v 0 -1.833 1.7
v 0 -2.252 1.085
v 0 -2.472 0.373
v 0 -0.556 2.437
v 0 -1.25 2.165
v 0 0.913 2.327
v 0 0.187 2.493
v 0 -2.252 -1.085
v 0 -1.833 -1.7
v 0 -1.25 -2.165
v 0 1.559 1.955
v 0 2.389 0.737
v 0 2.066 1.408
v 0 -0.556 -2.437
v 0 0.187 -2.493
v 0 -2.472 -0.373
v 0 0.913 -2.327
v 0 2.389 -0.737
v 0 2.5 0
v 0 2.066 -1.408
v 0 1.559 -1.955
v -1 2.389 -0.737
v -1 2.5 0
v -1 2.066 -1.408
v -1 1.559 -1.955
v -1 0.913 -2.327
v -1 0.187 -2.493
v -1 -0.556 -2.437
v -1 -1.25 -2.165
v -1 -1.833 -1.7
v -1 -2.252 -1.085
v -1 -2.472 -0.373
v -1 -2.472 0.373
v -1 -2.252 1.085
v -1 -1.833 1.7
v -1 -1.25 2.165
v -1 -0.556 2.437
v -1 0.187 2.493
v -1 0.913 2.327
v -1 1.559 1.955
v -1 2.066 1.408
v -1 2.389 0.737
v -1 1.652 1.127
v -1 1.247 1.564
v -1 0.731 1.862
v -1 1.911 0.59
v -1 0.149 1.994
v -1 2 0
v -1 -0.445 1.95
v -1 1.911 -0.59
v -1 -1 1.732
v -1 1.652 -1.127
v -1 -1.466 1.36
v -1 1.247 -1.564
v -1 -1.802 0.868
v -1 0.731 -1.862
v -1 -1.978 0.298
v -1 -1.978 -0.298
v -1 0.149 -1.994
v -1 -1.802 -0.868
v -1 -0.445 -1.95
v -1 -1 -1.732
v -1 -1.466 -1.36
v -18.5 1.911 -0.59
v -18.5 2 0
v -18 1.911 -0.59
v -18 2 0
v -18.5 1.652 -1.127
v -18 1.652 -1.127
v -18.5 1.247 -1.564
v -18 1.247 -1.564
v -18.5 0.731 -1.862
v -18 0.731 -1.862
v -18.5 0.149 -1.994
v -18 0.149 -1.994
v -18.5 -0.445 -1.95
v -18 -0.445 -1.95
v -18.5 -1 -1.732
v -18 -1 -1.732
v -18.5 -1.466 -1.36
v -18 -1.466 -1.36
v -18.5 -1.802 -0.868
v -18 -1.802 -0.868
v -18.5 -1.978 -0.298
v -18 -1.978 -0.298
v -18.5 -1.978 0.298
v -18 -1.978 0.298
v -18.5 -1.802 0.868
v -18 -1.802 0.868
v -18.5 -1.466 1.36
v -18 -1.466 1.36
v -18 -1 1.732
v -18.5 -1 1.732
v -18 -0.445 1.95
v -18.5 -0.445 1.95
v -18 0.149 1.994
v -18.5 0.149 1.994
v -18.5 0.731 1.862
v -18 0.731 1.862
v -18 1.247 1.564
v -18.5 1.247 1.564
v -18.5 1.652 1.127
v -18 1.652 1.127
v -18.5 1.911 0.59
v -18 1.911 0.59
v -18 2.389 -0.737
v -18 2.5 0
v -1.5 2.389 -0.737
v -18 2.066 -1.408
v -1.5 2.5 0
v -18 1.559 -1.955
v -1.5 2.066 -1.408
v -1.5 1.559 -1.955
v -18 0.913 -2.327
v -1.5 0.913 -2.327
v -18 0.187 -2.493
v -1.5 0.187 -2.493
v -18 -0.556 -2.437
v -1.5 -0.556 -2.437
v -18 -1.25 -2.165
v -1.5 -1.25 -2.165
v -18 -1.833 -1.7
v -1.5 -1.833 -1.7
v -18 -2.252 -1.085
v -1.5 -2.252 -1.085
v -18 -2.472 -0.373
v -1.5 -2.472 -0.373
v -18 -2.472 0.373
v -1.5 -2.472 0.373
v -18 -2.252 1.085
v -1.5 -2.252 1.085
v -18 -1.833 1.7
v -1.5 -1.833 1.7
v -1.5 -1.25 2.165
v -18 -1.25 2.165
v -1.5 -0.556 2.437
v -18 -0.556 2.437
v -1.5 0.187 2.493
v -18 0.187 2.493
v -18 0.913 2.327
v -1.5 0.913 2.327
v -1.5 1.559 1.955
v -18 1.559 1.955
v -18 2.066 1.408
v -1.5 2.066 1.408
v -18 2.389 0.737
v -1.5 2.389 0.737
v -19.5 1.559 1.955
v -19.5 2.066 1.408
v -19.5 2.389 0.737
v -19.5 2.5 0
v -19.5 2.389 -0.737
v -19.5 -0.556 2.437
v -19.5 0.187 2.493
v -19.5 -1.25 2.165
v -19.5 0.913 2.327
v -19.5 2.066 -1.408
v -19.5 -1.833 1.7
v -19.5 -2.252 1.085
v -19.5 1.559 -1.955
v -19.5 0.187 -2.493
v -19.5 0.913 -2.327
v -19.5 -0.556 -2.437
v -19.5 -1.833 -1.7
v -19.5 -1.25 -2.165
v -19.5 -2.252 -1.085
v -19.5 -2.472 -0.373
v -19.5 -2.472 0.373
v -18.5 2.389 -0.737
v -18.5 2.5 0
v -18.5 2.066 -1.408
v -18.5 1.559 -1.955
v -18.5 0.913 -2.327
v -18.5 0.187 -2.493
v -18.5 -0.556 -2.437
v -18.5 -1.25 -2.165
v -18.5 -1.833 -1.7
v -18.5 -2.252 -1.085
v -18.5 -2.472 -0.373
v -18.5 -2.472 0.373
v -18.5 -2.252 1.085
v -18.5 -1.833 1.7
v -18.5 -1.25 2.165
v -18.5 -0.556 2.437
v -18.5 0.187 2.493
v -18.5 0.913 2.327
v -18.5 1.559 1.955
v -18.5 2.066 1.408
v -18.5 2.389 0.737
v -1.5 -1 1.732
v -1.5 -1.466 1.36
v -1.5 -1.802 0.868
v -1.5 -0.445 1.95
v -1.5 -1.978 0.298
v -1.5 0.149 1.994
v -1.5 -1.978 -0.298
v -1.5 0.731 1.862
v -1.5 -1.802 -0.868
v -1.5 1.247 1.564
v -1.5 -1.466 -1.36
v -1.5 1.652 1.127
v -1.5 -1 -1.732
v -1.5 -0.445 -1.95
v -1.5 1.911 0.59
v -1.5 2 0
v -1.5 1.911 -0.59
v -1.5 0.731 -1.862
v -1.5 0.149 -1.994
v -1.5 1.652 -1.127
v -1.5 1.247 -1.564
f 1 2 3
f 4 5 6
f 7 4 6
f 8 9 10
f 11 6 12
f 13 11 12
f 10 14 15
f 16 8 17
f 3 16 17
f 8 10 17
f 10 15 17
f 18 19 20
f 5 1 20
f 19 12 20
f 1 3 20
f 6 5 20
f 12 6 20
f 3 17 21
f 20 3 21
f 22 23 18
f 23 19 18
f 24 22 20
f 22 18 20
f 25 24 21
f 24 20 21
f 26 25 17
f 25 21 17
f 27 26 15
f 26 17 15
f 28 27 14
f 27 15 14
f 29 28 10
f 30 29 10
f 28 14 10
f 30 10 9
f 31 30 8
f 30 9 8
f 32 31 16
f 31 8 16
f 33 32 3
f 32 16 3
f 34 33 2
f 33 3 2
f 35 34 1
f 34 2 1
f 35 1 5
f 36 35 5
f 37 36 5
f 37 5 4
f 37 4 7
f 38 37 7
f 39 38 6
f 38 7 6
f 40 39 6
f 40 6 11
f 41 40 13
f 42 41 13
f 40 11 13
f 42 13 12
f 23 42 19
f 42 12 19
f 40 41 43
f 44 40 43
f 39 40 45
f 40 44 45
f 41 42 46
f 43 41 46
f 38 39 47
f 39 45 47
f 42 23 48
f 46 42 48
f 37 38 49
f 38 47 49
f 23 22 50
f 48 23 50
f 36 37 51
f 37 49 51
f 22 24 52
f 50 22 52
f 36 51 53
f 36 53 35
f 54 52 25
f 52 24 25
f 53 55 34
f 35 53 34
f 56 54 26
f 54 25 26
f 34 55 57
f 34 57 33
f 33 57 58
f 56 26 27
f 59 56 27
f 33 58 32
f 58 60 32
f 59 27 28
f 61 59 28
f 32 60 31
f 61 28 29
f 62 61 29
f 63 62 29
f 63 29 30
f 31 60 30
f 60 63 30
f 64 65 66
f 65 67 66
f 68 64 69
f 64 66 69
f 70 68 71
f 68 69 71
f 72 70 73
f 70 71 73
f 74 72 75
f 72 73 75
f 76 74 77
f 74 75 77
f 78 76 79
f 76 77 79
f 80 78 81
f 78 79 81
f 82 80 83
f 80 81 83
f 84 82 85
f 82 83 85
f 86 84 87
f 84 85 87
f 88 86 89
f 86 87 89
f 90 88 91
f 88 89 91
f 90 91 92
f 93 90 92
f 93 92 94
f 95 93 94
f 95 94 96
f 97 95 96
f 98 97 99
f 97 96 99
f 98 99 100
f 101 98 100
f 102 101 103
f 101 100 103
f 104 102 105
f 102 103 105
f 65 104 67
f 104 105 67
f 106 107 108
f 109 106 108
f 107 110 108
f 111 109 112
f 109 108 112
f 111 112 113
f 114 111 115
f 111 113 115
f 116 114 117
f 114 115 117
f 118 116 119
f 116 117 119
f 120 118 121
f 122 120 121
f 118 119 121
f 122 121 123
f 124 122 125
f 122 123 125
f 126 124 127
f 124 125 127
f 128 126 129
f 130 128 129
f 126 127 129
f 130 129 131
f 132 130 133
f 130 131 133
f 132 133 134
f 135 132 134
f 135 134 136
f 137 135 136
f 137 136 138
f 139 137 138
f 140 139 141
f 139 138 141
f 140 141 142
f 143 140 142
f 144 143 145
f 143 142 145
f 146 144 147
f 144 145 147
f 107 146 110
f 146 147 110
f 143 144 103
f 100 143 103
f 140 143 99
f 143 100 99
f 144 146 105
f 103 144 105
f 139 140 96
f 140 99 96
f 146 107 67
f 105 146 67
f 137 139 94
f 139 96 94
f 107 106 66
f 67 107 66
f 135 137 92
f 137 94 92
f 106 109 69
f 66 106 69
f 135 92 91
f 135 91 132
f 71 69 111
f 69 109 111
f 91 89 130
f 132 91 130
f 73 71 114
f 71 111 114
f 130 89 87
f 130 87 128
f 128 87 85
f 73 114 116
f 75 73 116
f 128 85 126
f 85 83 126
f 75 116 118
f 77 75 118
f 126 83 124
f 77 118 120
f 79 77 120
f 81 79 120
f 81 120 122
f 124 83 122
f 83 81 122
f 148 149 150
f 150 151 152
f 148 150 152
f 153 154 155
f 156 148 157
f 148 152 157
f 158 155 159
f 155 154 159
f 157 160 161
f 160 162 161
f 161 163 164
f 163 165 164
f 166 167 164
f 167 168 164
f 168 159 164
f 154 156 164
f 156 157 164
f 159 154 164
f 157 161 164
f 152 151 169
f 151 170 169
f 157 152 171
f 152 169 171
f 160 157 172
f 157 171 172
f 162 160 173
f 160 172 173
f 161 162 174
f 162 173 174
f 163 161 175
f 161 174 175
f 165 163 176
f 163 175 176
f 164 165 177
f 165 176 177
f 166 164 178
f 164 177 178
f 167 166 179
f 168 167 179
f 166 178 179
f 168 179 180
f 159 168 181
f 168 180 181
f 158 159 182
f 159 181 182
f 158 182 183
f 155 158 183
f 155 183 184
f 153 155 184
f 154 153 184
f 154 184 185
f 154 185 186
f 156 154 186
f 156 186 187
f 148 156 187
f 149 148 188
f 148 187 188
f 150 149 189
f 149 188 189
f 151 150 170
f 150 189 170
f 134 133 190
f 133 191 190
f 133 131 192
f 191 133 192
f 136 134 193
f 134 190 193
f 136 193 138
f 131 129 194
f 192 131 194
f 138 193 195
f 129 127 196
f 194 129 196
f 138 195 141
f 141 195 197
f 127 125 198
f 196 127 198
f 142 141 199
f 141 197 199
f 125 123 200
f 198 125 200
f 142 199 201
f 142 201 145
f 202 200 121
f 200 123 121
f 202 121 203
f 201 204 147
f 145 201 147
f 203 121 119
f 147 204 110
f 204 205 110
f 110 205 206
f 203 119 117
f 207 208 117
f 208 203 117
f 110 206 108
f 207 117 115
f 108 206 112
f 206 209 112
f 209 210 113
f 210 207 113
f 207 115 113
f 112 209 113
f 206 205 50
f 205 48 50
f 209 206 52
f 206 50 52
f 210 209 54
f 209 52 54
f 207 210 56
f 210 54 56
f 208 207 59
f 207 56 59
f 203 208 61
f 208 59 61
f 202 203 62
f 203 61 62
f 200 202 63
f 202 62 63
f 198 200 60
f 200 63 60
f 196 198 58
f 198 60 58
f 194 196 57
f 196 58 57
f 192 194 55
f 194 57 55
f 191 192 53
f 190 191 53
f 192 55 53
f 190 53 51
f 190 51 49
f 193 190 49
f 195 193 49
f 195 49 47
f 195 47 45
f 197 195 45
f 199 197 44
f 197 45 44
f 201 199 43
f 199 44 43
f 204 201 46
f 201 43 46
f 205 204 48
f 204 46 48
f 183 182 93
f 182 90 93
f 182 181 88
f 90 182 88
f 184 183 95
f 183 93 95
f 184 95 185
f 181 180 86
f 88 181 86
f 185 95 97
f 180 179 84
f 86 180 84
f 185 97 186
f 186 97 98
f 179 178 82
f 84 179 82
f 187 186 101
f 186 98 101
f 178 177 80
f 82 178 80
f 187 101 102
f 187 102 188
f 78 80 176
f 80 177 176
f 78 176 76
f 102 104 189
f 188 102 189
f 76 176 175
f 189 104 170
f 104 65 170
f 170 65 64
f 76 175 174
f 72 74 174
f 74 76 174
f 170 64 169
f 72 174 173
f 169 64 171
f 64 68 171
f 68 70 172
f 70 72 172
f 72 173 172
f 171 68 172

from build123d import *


with BuildPart() as part:
    # Sketch2 → Revolve1 (revolve)
    with BuildSketch(Plane.XY):
        Polygon((0, 2.5), (0, 0), (-19.5, 0), (-19.5, 2.5), (-18.5, 2.5), (-18.5, 2), (-18, 2), (-18, 2.5), (-1.5, 2.5), (-1.5, 2), (-1, 2), (-1, 2.5), align=None)
    revolve(axis=Axis((0, 0, 0), (-1, 0, 0)))


solid = part.part
